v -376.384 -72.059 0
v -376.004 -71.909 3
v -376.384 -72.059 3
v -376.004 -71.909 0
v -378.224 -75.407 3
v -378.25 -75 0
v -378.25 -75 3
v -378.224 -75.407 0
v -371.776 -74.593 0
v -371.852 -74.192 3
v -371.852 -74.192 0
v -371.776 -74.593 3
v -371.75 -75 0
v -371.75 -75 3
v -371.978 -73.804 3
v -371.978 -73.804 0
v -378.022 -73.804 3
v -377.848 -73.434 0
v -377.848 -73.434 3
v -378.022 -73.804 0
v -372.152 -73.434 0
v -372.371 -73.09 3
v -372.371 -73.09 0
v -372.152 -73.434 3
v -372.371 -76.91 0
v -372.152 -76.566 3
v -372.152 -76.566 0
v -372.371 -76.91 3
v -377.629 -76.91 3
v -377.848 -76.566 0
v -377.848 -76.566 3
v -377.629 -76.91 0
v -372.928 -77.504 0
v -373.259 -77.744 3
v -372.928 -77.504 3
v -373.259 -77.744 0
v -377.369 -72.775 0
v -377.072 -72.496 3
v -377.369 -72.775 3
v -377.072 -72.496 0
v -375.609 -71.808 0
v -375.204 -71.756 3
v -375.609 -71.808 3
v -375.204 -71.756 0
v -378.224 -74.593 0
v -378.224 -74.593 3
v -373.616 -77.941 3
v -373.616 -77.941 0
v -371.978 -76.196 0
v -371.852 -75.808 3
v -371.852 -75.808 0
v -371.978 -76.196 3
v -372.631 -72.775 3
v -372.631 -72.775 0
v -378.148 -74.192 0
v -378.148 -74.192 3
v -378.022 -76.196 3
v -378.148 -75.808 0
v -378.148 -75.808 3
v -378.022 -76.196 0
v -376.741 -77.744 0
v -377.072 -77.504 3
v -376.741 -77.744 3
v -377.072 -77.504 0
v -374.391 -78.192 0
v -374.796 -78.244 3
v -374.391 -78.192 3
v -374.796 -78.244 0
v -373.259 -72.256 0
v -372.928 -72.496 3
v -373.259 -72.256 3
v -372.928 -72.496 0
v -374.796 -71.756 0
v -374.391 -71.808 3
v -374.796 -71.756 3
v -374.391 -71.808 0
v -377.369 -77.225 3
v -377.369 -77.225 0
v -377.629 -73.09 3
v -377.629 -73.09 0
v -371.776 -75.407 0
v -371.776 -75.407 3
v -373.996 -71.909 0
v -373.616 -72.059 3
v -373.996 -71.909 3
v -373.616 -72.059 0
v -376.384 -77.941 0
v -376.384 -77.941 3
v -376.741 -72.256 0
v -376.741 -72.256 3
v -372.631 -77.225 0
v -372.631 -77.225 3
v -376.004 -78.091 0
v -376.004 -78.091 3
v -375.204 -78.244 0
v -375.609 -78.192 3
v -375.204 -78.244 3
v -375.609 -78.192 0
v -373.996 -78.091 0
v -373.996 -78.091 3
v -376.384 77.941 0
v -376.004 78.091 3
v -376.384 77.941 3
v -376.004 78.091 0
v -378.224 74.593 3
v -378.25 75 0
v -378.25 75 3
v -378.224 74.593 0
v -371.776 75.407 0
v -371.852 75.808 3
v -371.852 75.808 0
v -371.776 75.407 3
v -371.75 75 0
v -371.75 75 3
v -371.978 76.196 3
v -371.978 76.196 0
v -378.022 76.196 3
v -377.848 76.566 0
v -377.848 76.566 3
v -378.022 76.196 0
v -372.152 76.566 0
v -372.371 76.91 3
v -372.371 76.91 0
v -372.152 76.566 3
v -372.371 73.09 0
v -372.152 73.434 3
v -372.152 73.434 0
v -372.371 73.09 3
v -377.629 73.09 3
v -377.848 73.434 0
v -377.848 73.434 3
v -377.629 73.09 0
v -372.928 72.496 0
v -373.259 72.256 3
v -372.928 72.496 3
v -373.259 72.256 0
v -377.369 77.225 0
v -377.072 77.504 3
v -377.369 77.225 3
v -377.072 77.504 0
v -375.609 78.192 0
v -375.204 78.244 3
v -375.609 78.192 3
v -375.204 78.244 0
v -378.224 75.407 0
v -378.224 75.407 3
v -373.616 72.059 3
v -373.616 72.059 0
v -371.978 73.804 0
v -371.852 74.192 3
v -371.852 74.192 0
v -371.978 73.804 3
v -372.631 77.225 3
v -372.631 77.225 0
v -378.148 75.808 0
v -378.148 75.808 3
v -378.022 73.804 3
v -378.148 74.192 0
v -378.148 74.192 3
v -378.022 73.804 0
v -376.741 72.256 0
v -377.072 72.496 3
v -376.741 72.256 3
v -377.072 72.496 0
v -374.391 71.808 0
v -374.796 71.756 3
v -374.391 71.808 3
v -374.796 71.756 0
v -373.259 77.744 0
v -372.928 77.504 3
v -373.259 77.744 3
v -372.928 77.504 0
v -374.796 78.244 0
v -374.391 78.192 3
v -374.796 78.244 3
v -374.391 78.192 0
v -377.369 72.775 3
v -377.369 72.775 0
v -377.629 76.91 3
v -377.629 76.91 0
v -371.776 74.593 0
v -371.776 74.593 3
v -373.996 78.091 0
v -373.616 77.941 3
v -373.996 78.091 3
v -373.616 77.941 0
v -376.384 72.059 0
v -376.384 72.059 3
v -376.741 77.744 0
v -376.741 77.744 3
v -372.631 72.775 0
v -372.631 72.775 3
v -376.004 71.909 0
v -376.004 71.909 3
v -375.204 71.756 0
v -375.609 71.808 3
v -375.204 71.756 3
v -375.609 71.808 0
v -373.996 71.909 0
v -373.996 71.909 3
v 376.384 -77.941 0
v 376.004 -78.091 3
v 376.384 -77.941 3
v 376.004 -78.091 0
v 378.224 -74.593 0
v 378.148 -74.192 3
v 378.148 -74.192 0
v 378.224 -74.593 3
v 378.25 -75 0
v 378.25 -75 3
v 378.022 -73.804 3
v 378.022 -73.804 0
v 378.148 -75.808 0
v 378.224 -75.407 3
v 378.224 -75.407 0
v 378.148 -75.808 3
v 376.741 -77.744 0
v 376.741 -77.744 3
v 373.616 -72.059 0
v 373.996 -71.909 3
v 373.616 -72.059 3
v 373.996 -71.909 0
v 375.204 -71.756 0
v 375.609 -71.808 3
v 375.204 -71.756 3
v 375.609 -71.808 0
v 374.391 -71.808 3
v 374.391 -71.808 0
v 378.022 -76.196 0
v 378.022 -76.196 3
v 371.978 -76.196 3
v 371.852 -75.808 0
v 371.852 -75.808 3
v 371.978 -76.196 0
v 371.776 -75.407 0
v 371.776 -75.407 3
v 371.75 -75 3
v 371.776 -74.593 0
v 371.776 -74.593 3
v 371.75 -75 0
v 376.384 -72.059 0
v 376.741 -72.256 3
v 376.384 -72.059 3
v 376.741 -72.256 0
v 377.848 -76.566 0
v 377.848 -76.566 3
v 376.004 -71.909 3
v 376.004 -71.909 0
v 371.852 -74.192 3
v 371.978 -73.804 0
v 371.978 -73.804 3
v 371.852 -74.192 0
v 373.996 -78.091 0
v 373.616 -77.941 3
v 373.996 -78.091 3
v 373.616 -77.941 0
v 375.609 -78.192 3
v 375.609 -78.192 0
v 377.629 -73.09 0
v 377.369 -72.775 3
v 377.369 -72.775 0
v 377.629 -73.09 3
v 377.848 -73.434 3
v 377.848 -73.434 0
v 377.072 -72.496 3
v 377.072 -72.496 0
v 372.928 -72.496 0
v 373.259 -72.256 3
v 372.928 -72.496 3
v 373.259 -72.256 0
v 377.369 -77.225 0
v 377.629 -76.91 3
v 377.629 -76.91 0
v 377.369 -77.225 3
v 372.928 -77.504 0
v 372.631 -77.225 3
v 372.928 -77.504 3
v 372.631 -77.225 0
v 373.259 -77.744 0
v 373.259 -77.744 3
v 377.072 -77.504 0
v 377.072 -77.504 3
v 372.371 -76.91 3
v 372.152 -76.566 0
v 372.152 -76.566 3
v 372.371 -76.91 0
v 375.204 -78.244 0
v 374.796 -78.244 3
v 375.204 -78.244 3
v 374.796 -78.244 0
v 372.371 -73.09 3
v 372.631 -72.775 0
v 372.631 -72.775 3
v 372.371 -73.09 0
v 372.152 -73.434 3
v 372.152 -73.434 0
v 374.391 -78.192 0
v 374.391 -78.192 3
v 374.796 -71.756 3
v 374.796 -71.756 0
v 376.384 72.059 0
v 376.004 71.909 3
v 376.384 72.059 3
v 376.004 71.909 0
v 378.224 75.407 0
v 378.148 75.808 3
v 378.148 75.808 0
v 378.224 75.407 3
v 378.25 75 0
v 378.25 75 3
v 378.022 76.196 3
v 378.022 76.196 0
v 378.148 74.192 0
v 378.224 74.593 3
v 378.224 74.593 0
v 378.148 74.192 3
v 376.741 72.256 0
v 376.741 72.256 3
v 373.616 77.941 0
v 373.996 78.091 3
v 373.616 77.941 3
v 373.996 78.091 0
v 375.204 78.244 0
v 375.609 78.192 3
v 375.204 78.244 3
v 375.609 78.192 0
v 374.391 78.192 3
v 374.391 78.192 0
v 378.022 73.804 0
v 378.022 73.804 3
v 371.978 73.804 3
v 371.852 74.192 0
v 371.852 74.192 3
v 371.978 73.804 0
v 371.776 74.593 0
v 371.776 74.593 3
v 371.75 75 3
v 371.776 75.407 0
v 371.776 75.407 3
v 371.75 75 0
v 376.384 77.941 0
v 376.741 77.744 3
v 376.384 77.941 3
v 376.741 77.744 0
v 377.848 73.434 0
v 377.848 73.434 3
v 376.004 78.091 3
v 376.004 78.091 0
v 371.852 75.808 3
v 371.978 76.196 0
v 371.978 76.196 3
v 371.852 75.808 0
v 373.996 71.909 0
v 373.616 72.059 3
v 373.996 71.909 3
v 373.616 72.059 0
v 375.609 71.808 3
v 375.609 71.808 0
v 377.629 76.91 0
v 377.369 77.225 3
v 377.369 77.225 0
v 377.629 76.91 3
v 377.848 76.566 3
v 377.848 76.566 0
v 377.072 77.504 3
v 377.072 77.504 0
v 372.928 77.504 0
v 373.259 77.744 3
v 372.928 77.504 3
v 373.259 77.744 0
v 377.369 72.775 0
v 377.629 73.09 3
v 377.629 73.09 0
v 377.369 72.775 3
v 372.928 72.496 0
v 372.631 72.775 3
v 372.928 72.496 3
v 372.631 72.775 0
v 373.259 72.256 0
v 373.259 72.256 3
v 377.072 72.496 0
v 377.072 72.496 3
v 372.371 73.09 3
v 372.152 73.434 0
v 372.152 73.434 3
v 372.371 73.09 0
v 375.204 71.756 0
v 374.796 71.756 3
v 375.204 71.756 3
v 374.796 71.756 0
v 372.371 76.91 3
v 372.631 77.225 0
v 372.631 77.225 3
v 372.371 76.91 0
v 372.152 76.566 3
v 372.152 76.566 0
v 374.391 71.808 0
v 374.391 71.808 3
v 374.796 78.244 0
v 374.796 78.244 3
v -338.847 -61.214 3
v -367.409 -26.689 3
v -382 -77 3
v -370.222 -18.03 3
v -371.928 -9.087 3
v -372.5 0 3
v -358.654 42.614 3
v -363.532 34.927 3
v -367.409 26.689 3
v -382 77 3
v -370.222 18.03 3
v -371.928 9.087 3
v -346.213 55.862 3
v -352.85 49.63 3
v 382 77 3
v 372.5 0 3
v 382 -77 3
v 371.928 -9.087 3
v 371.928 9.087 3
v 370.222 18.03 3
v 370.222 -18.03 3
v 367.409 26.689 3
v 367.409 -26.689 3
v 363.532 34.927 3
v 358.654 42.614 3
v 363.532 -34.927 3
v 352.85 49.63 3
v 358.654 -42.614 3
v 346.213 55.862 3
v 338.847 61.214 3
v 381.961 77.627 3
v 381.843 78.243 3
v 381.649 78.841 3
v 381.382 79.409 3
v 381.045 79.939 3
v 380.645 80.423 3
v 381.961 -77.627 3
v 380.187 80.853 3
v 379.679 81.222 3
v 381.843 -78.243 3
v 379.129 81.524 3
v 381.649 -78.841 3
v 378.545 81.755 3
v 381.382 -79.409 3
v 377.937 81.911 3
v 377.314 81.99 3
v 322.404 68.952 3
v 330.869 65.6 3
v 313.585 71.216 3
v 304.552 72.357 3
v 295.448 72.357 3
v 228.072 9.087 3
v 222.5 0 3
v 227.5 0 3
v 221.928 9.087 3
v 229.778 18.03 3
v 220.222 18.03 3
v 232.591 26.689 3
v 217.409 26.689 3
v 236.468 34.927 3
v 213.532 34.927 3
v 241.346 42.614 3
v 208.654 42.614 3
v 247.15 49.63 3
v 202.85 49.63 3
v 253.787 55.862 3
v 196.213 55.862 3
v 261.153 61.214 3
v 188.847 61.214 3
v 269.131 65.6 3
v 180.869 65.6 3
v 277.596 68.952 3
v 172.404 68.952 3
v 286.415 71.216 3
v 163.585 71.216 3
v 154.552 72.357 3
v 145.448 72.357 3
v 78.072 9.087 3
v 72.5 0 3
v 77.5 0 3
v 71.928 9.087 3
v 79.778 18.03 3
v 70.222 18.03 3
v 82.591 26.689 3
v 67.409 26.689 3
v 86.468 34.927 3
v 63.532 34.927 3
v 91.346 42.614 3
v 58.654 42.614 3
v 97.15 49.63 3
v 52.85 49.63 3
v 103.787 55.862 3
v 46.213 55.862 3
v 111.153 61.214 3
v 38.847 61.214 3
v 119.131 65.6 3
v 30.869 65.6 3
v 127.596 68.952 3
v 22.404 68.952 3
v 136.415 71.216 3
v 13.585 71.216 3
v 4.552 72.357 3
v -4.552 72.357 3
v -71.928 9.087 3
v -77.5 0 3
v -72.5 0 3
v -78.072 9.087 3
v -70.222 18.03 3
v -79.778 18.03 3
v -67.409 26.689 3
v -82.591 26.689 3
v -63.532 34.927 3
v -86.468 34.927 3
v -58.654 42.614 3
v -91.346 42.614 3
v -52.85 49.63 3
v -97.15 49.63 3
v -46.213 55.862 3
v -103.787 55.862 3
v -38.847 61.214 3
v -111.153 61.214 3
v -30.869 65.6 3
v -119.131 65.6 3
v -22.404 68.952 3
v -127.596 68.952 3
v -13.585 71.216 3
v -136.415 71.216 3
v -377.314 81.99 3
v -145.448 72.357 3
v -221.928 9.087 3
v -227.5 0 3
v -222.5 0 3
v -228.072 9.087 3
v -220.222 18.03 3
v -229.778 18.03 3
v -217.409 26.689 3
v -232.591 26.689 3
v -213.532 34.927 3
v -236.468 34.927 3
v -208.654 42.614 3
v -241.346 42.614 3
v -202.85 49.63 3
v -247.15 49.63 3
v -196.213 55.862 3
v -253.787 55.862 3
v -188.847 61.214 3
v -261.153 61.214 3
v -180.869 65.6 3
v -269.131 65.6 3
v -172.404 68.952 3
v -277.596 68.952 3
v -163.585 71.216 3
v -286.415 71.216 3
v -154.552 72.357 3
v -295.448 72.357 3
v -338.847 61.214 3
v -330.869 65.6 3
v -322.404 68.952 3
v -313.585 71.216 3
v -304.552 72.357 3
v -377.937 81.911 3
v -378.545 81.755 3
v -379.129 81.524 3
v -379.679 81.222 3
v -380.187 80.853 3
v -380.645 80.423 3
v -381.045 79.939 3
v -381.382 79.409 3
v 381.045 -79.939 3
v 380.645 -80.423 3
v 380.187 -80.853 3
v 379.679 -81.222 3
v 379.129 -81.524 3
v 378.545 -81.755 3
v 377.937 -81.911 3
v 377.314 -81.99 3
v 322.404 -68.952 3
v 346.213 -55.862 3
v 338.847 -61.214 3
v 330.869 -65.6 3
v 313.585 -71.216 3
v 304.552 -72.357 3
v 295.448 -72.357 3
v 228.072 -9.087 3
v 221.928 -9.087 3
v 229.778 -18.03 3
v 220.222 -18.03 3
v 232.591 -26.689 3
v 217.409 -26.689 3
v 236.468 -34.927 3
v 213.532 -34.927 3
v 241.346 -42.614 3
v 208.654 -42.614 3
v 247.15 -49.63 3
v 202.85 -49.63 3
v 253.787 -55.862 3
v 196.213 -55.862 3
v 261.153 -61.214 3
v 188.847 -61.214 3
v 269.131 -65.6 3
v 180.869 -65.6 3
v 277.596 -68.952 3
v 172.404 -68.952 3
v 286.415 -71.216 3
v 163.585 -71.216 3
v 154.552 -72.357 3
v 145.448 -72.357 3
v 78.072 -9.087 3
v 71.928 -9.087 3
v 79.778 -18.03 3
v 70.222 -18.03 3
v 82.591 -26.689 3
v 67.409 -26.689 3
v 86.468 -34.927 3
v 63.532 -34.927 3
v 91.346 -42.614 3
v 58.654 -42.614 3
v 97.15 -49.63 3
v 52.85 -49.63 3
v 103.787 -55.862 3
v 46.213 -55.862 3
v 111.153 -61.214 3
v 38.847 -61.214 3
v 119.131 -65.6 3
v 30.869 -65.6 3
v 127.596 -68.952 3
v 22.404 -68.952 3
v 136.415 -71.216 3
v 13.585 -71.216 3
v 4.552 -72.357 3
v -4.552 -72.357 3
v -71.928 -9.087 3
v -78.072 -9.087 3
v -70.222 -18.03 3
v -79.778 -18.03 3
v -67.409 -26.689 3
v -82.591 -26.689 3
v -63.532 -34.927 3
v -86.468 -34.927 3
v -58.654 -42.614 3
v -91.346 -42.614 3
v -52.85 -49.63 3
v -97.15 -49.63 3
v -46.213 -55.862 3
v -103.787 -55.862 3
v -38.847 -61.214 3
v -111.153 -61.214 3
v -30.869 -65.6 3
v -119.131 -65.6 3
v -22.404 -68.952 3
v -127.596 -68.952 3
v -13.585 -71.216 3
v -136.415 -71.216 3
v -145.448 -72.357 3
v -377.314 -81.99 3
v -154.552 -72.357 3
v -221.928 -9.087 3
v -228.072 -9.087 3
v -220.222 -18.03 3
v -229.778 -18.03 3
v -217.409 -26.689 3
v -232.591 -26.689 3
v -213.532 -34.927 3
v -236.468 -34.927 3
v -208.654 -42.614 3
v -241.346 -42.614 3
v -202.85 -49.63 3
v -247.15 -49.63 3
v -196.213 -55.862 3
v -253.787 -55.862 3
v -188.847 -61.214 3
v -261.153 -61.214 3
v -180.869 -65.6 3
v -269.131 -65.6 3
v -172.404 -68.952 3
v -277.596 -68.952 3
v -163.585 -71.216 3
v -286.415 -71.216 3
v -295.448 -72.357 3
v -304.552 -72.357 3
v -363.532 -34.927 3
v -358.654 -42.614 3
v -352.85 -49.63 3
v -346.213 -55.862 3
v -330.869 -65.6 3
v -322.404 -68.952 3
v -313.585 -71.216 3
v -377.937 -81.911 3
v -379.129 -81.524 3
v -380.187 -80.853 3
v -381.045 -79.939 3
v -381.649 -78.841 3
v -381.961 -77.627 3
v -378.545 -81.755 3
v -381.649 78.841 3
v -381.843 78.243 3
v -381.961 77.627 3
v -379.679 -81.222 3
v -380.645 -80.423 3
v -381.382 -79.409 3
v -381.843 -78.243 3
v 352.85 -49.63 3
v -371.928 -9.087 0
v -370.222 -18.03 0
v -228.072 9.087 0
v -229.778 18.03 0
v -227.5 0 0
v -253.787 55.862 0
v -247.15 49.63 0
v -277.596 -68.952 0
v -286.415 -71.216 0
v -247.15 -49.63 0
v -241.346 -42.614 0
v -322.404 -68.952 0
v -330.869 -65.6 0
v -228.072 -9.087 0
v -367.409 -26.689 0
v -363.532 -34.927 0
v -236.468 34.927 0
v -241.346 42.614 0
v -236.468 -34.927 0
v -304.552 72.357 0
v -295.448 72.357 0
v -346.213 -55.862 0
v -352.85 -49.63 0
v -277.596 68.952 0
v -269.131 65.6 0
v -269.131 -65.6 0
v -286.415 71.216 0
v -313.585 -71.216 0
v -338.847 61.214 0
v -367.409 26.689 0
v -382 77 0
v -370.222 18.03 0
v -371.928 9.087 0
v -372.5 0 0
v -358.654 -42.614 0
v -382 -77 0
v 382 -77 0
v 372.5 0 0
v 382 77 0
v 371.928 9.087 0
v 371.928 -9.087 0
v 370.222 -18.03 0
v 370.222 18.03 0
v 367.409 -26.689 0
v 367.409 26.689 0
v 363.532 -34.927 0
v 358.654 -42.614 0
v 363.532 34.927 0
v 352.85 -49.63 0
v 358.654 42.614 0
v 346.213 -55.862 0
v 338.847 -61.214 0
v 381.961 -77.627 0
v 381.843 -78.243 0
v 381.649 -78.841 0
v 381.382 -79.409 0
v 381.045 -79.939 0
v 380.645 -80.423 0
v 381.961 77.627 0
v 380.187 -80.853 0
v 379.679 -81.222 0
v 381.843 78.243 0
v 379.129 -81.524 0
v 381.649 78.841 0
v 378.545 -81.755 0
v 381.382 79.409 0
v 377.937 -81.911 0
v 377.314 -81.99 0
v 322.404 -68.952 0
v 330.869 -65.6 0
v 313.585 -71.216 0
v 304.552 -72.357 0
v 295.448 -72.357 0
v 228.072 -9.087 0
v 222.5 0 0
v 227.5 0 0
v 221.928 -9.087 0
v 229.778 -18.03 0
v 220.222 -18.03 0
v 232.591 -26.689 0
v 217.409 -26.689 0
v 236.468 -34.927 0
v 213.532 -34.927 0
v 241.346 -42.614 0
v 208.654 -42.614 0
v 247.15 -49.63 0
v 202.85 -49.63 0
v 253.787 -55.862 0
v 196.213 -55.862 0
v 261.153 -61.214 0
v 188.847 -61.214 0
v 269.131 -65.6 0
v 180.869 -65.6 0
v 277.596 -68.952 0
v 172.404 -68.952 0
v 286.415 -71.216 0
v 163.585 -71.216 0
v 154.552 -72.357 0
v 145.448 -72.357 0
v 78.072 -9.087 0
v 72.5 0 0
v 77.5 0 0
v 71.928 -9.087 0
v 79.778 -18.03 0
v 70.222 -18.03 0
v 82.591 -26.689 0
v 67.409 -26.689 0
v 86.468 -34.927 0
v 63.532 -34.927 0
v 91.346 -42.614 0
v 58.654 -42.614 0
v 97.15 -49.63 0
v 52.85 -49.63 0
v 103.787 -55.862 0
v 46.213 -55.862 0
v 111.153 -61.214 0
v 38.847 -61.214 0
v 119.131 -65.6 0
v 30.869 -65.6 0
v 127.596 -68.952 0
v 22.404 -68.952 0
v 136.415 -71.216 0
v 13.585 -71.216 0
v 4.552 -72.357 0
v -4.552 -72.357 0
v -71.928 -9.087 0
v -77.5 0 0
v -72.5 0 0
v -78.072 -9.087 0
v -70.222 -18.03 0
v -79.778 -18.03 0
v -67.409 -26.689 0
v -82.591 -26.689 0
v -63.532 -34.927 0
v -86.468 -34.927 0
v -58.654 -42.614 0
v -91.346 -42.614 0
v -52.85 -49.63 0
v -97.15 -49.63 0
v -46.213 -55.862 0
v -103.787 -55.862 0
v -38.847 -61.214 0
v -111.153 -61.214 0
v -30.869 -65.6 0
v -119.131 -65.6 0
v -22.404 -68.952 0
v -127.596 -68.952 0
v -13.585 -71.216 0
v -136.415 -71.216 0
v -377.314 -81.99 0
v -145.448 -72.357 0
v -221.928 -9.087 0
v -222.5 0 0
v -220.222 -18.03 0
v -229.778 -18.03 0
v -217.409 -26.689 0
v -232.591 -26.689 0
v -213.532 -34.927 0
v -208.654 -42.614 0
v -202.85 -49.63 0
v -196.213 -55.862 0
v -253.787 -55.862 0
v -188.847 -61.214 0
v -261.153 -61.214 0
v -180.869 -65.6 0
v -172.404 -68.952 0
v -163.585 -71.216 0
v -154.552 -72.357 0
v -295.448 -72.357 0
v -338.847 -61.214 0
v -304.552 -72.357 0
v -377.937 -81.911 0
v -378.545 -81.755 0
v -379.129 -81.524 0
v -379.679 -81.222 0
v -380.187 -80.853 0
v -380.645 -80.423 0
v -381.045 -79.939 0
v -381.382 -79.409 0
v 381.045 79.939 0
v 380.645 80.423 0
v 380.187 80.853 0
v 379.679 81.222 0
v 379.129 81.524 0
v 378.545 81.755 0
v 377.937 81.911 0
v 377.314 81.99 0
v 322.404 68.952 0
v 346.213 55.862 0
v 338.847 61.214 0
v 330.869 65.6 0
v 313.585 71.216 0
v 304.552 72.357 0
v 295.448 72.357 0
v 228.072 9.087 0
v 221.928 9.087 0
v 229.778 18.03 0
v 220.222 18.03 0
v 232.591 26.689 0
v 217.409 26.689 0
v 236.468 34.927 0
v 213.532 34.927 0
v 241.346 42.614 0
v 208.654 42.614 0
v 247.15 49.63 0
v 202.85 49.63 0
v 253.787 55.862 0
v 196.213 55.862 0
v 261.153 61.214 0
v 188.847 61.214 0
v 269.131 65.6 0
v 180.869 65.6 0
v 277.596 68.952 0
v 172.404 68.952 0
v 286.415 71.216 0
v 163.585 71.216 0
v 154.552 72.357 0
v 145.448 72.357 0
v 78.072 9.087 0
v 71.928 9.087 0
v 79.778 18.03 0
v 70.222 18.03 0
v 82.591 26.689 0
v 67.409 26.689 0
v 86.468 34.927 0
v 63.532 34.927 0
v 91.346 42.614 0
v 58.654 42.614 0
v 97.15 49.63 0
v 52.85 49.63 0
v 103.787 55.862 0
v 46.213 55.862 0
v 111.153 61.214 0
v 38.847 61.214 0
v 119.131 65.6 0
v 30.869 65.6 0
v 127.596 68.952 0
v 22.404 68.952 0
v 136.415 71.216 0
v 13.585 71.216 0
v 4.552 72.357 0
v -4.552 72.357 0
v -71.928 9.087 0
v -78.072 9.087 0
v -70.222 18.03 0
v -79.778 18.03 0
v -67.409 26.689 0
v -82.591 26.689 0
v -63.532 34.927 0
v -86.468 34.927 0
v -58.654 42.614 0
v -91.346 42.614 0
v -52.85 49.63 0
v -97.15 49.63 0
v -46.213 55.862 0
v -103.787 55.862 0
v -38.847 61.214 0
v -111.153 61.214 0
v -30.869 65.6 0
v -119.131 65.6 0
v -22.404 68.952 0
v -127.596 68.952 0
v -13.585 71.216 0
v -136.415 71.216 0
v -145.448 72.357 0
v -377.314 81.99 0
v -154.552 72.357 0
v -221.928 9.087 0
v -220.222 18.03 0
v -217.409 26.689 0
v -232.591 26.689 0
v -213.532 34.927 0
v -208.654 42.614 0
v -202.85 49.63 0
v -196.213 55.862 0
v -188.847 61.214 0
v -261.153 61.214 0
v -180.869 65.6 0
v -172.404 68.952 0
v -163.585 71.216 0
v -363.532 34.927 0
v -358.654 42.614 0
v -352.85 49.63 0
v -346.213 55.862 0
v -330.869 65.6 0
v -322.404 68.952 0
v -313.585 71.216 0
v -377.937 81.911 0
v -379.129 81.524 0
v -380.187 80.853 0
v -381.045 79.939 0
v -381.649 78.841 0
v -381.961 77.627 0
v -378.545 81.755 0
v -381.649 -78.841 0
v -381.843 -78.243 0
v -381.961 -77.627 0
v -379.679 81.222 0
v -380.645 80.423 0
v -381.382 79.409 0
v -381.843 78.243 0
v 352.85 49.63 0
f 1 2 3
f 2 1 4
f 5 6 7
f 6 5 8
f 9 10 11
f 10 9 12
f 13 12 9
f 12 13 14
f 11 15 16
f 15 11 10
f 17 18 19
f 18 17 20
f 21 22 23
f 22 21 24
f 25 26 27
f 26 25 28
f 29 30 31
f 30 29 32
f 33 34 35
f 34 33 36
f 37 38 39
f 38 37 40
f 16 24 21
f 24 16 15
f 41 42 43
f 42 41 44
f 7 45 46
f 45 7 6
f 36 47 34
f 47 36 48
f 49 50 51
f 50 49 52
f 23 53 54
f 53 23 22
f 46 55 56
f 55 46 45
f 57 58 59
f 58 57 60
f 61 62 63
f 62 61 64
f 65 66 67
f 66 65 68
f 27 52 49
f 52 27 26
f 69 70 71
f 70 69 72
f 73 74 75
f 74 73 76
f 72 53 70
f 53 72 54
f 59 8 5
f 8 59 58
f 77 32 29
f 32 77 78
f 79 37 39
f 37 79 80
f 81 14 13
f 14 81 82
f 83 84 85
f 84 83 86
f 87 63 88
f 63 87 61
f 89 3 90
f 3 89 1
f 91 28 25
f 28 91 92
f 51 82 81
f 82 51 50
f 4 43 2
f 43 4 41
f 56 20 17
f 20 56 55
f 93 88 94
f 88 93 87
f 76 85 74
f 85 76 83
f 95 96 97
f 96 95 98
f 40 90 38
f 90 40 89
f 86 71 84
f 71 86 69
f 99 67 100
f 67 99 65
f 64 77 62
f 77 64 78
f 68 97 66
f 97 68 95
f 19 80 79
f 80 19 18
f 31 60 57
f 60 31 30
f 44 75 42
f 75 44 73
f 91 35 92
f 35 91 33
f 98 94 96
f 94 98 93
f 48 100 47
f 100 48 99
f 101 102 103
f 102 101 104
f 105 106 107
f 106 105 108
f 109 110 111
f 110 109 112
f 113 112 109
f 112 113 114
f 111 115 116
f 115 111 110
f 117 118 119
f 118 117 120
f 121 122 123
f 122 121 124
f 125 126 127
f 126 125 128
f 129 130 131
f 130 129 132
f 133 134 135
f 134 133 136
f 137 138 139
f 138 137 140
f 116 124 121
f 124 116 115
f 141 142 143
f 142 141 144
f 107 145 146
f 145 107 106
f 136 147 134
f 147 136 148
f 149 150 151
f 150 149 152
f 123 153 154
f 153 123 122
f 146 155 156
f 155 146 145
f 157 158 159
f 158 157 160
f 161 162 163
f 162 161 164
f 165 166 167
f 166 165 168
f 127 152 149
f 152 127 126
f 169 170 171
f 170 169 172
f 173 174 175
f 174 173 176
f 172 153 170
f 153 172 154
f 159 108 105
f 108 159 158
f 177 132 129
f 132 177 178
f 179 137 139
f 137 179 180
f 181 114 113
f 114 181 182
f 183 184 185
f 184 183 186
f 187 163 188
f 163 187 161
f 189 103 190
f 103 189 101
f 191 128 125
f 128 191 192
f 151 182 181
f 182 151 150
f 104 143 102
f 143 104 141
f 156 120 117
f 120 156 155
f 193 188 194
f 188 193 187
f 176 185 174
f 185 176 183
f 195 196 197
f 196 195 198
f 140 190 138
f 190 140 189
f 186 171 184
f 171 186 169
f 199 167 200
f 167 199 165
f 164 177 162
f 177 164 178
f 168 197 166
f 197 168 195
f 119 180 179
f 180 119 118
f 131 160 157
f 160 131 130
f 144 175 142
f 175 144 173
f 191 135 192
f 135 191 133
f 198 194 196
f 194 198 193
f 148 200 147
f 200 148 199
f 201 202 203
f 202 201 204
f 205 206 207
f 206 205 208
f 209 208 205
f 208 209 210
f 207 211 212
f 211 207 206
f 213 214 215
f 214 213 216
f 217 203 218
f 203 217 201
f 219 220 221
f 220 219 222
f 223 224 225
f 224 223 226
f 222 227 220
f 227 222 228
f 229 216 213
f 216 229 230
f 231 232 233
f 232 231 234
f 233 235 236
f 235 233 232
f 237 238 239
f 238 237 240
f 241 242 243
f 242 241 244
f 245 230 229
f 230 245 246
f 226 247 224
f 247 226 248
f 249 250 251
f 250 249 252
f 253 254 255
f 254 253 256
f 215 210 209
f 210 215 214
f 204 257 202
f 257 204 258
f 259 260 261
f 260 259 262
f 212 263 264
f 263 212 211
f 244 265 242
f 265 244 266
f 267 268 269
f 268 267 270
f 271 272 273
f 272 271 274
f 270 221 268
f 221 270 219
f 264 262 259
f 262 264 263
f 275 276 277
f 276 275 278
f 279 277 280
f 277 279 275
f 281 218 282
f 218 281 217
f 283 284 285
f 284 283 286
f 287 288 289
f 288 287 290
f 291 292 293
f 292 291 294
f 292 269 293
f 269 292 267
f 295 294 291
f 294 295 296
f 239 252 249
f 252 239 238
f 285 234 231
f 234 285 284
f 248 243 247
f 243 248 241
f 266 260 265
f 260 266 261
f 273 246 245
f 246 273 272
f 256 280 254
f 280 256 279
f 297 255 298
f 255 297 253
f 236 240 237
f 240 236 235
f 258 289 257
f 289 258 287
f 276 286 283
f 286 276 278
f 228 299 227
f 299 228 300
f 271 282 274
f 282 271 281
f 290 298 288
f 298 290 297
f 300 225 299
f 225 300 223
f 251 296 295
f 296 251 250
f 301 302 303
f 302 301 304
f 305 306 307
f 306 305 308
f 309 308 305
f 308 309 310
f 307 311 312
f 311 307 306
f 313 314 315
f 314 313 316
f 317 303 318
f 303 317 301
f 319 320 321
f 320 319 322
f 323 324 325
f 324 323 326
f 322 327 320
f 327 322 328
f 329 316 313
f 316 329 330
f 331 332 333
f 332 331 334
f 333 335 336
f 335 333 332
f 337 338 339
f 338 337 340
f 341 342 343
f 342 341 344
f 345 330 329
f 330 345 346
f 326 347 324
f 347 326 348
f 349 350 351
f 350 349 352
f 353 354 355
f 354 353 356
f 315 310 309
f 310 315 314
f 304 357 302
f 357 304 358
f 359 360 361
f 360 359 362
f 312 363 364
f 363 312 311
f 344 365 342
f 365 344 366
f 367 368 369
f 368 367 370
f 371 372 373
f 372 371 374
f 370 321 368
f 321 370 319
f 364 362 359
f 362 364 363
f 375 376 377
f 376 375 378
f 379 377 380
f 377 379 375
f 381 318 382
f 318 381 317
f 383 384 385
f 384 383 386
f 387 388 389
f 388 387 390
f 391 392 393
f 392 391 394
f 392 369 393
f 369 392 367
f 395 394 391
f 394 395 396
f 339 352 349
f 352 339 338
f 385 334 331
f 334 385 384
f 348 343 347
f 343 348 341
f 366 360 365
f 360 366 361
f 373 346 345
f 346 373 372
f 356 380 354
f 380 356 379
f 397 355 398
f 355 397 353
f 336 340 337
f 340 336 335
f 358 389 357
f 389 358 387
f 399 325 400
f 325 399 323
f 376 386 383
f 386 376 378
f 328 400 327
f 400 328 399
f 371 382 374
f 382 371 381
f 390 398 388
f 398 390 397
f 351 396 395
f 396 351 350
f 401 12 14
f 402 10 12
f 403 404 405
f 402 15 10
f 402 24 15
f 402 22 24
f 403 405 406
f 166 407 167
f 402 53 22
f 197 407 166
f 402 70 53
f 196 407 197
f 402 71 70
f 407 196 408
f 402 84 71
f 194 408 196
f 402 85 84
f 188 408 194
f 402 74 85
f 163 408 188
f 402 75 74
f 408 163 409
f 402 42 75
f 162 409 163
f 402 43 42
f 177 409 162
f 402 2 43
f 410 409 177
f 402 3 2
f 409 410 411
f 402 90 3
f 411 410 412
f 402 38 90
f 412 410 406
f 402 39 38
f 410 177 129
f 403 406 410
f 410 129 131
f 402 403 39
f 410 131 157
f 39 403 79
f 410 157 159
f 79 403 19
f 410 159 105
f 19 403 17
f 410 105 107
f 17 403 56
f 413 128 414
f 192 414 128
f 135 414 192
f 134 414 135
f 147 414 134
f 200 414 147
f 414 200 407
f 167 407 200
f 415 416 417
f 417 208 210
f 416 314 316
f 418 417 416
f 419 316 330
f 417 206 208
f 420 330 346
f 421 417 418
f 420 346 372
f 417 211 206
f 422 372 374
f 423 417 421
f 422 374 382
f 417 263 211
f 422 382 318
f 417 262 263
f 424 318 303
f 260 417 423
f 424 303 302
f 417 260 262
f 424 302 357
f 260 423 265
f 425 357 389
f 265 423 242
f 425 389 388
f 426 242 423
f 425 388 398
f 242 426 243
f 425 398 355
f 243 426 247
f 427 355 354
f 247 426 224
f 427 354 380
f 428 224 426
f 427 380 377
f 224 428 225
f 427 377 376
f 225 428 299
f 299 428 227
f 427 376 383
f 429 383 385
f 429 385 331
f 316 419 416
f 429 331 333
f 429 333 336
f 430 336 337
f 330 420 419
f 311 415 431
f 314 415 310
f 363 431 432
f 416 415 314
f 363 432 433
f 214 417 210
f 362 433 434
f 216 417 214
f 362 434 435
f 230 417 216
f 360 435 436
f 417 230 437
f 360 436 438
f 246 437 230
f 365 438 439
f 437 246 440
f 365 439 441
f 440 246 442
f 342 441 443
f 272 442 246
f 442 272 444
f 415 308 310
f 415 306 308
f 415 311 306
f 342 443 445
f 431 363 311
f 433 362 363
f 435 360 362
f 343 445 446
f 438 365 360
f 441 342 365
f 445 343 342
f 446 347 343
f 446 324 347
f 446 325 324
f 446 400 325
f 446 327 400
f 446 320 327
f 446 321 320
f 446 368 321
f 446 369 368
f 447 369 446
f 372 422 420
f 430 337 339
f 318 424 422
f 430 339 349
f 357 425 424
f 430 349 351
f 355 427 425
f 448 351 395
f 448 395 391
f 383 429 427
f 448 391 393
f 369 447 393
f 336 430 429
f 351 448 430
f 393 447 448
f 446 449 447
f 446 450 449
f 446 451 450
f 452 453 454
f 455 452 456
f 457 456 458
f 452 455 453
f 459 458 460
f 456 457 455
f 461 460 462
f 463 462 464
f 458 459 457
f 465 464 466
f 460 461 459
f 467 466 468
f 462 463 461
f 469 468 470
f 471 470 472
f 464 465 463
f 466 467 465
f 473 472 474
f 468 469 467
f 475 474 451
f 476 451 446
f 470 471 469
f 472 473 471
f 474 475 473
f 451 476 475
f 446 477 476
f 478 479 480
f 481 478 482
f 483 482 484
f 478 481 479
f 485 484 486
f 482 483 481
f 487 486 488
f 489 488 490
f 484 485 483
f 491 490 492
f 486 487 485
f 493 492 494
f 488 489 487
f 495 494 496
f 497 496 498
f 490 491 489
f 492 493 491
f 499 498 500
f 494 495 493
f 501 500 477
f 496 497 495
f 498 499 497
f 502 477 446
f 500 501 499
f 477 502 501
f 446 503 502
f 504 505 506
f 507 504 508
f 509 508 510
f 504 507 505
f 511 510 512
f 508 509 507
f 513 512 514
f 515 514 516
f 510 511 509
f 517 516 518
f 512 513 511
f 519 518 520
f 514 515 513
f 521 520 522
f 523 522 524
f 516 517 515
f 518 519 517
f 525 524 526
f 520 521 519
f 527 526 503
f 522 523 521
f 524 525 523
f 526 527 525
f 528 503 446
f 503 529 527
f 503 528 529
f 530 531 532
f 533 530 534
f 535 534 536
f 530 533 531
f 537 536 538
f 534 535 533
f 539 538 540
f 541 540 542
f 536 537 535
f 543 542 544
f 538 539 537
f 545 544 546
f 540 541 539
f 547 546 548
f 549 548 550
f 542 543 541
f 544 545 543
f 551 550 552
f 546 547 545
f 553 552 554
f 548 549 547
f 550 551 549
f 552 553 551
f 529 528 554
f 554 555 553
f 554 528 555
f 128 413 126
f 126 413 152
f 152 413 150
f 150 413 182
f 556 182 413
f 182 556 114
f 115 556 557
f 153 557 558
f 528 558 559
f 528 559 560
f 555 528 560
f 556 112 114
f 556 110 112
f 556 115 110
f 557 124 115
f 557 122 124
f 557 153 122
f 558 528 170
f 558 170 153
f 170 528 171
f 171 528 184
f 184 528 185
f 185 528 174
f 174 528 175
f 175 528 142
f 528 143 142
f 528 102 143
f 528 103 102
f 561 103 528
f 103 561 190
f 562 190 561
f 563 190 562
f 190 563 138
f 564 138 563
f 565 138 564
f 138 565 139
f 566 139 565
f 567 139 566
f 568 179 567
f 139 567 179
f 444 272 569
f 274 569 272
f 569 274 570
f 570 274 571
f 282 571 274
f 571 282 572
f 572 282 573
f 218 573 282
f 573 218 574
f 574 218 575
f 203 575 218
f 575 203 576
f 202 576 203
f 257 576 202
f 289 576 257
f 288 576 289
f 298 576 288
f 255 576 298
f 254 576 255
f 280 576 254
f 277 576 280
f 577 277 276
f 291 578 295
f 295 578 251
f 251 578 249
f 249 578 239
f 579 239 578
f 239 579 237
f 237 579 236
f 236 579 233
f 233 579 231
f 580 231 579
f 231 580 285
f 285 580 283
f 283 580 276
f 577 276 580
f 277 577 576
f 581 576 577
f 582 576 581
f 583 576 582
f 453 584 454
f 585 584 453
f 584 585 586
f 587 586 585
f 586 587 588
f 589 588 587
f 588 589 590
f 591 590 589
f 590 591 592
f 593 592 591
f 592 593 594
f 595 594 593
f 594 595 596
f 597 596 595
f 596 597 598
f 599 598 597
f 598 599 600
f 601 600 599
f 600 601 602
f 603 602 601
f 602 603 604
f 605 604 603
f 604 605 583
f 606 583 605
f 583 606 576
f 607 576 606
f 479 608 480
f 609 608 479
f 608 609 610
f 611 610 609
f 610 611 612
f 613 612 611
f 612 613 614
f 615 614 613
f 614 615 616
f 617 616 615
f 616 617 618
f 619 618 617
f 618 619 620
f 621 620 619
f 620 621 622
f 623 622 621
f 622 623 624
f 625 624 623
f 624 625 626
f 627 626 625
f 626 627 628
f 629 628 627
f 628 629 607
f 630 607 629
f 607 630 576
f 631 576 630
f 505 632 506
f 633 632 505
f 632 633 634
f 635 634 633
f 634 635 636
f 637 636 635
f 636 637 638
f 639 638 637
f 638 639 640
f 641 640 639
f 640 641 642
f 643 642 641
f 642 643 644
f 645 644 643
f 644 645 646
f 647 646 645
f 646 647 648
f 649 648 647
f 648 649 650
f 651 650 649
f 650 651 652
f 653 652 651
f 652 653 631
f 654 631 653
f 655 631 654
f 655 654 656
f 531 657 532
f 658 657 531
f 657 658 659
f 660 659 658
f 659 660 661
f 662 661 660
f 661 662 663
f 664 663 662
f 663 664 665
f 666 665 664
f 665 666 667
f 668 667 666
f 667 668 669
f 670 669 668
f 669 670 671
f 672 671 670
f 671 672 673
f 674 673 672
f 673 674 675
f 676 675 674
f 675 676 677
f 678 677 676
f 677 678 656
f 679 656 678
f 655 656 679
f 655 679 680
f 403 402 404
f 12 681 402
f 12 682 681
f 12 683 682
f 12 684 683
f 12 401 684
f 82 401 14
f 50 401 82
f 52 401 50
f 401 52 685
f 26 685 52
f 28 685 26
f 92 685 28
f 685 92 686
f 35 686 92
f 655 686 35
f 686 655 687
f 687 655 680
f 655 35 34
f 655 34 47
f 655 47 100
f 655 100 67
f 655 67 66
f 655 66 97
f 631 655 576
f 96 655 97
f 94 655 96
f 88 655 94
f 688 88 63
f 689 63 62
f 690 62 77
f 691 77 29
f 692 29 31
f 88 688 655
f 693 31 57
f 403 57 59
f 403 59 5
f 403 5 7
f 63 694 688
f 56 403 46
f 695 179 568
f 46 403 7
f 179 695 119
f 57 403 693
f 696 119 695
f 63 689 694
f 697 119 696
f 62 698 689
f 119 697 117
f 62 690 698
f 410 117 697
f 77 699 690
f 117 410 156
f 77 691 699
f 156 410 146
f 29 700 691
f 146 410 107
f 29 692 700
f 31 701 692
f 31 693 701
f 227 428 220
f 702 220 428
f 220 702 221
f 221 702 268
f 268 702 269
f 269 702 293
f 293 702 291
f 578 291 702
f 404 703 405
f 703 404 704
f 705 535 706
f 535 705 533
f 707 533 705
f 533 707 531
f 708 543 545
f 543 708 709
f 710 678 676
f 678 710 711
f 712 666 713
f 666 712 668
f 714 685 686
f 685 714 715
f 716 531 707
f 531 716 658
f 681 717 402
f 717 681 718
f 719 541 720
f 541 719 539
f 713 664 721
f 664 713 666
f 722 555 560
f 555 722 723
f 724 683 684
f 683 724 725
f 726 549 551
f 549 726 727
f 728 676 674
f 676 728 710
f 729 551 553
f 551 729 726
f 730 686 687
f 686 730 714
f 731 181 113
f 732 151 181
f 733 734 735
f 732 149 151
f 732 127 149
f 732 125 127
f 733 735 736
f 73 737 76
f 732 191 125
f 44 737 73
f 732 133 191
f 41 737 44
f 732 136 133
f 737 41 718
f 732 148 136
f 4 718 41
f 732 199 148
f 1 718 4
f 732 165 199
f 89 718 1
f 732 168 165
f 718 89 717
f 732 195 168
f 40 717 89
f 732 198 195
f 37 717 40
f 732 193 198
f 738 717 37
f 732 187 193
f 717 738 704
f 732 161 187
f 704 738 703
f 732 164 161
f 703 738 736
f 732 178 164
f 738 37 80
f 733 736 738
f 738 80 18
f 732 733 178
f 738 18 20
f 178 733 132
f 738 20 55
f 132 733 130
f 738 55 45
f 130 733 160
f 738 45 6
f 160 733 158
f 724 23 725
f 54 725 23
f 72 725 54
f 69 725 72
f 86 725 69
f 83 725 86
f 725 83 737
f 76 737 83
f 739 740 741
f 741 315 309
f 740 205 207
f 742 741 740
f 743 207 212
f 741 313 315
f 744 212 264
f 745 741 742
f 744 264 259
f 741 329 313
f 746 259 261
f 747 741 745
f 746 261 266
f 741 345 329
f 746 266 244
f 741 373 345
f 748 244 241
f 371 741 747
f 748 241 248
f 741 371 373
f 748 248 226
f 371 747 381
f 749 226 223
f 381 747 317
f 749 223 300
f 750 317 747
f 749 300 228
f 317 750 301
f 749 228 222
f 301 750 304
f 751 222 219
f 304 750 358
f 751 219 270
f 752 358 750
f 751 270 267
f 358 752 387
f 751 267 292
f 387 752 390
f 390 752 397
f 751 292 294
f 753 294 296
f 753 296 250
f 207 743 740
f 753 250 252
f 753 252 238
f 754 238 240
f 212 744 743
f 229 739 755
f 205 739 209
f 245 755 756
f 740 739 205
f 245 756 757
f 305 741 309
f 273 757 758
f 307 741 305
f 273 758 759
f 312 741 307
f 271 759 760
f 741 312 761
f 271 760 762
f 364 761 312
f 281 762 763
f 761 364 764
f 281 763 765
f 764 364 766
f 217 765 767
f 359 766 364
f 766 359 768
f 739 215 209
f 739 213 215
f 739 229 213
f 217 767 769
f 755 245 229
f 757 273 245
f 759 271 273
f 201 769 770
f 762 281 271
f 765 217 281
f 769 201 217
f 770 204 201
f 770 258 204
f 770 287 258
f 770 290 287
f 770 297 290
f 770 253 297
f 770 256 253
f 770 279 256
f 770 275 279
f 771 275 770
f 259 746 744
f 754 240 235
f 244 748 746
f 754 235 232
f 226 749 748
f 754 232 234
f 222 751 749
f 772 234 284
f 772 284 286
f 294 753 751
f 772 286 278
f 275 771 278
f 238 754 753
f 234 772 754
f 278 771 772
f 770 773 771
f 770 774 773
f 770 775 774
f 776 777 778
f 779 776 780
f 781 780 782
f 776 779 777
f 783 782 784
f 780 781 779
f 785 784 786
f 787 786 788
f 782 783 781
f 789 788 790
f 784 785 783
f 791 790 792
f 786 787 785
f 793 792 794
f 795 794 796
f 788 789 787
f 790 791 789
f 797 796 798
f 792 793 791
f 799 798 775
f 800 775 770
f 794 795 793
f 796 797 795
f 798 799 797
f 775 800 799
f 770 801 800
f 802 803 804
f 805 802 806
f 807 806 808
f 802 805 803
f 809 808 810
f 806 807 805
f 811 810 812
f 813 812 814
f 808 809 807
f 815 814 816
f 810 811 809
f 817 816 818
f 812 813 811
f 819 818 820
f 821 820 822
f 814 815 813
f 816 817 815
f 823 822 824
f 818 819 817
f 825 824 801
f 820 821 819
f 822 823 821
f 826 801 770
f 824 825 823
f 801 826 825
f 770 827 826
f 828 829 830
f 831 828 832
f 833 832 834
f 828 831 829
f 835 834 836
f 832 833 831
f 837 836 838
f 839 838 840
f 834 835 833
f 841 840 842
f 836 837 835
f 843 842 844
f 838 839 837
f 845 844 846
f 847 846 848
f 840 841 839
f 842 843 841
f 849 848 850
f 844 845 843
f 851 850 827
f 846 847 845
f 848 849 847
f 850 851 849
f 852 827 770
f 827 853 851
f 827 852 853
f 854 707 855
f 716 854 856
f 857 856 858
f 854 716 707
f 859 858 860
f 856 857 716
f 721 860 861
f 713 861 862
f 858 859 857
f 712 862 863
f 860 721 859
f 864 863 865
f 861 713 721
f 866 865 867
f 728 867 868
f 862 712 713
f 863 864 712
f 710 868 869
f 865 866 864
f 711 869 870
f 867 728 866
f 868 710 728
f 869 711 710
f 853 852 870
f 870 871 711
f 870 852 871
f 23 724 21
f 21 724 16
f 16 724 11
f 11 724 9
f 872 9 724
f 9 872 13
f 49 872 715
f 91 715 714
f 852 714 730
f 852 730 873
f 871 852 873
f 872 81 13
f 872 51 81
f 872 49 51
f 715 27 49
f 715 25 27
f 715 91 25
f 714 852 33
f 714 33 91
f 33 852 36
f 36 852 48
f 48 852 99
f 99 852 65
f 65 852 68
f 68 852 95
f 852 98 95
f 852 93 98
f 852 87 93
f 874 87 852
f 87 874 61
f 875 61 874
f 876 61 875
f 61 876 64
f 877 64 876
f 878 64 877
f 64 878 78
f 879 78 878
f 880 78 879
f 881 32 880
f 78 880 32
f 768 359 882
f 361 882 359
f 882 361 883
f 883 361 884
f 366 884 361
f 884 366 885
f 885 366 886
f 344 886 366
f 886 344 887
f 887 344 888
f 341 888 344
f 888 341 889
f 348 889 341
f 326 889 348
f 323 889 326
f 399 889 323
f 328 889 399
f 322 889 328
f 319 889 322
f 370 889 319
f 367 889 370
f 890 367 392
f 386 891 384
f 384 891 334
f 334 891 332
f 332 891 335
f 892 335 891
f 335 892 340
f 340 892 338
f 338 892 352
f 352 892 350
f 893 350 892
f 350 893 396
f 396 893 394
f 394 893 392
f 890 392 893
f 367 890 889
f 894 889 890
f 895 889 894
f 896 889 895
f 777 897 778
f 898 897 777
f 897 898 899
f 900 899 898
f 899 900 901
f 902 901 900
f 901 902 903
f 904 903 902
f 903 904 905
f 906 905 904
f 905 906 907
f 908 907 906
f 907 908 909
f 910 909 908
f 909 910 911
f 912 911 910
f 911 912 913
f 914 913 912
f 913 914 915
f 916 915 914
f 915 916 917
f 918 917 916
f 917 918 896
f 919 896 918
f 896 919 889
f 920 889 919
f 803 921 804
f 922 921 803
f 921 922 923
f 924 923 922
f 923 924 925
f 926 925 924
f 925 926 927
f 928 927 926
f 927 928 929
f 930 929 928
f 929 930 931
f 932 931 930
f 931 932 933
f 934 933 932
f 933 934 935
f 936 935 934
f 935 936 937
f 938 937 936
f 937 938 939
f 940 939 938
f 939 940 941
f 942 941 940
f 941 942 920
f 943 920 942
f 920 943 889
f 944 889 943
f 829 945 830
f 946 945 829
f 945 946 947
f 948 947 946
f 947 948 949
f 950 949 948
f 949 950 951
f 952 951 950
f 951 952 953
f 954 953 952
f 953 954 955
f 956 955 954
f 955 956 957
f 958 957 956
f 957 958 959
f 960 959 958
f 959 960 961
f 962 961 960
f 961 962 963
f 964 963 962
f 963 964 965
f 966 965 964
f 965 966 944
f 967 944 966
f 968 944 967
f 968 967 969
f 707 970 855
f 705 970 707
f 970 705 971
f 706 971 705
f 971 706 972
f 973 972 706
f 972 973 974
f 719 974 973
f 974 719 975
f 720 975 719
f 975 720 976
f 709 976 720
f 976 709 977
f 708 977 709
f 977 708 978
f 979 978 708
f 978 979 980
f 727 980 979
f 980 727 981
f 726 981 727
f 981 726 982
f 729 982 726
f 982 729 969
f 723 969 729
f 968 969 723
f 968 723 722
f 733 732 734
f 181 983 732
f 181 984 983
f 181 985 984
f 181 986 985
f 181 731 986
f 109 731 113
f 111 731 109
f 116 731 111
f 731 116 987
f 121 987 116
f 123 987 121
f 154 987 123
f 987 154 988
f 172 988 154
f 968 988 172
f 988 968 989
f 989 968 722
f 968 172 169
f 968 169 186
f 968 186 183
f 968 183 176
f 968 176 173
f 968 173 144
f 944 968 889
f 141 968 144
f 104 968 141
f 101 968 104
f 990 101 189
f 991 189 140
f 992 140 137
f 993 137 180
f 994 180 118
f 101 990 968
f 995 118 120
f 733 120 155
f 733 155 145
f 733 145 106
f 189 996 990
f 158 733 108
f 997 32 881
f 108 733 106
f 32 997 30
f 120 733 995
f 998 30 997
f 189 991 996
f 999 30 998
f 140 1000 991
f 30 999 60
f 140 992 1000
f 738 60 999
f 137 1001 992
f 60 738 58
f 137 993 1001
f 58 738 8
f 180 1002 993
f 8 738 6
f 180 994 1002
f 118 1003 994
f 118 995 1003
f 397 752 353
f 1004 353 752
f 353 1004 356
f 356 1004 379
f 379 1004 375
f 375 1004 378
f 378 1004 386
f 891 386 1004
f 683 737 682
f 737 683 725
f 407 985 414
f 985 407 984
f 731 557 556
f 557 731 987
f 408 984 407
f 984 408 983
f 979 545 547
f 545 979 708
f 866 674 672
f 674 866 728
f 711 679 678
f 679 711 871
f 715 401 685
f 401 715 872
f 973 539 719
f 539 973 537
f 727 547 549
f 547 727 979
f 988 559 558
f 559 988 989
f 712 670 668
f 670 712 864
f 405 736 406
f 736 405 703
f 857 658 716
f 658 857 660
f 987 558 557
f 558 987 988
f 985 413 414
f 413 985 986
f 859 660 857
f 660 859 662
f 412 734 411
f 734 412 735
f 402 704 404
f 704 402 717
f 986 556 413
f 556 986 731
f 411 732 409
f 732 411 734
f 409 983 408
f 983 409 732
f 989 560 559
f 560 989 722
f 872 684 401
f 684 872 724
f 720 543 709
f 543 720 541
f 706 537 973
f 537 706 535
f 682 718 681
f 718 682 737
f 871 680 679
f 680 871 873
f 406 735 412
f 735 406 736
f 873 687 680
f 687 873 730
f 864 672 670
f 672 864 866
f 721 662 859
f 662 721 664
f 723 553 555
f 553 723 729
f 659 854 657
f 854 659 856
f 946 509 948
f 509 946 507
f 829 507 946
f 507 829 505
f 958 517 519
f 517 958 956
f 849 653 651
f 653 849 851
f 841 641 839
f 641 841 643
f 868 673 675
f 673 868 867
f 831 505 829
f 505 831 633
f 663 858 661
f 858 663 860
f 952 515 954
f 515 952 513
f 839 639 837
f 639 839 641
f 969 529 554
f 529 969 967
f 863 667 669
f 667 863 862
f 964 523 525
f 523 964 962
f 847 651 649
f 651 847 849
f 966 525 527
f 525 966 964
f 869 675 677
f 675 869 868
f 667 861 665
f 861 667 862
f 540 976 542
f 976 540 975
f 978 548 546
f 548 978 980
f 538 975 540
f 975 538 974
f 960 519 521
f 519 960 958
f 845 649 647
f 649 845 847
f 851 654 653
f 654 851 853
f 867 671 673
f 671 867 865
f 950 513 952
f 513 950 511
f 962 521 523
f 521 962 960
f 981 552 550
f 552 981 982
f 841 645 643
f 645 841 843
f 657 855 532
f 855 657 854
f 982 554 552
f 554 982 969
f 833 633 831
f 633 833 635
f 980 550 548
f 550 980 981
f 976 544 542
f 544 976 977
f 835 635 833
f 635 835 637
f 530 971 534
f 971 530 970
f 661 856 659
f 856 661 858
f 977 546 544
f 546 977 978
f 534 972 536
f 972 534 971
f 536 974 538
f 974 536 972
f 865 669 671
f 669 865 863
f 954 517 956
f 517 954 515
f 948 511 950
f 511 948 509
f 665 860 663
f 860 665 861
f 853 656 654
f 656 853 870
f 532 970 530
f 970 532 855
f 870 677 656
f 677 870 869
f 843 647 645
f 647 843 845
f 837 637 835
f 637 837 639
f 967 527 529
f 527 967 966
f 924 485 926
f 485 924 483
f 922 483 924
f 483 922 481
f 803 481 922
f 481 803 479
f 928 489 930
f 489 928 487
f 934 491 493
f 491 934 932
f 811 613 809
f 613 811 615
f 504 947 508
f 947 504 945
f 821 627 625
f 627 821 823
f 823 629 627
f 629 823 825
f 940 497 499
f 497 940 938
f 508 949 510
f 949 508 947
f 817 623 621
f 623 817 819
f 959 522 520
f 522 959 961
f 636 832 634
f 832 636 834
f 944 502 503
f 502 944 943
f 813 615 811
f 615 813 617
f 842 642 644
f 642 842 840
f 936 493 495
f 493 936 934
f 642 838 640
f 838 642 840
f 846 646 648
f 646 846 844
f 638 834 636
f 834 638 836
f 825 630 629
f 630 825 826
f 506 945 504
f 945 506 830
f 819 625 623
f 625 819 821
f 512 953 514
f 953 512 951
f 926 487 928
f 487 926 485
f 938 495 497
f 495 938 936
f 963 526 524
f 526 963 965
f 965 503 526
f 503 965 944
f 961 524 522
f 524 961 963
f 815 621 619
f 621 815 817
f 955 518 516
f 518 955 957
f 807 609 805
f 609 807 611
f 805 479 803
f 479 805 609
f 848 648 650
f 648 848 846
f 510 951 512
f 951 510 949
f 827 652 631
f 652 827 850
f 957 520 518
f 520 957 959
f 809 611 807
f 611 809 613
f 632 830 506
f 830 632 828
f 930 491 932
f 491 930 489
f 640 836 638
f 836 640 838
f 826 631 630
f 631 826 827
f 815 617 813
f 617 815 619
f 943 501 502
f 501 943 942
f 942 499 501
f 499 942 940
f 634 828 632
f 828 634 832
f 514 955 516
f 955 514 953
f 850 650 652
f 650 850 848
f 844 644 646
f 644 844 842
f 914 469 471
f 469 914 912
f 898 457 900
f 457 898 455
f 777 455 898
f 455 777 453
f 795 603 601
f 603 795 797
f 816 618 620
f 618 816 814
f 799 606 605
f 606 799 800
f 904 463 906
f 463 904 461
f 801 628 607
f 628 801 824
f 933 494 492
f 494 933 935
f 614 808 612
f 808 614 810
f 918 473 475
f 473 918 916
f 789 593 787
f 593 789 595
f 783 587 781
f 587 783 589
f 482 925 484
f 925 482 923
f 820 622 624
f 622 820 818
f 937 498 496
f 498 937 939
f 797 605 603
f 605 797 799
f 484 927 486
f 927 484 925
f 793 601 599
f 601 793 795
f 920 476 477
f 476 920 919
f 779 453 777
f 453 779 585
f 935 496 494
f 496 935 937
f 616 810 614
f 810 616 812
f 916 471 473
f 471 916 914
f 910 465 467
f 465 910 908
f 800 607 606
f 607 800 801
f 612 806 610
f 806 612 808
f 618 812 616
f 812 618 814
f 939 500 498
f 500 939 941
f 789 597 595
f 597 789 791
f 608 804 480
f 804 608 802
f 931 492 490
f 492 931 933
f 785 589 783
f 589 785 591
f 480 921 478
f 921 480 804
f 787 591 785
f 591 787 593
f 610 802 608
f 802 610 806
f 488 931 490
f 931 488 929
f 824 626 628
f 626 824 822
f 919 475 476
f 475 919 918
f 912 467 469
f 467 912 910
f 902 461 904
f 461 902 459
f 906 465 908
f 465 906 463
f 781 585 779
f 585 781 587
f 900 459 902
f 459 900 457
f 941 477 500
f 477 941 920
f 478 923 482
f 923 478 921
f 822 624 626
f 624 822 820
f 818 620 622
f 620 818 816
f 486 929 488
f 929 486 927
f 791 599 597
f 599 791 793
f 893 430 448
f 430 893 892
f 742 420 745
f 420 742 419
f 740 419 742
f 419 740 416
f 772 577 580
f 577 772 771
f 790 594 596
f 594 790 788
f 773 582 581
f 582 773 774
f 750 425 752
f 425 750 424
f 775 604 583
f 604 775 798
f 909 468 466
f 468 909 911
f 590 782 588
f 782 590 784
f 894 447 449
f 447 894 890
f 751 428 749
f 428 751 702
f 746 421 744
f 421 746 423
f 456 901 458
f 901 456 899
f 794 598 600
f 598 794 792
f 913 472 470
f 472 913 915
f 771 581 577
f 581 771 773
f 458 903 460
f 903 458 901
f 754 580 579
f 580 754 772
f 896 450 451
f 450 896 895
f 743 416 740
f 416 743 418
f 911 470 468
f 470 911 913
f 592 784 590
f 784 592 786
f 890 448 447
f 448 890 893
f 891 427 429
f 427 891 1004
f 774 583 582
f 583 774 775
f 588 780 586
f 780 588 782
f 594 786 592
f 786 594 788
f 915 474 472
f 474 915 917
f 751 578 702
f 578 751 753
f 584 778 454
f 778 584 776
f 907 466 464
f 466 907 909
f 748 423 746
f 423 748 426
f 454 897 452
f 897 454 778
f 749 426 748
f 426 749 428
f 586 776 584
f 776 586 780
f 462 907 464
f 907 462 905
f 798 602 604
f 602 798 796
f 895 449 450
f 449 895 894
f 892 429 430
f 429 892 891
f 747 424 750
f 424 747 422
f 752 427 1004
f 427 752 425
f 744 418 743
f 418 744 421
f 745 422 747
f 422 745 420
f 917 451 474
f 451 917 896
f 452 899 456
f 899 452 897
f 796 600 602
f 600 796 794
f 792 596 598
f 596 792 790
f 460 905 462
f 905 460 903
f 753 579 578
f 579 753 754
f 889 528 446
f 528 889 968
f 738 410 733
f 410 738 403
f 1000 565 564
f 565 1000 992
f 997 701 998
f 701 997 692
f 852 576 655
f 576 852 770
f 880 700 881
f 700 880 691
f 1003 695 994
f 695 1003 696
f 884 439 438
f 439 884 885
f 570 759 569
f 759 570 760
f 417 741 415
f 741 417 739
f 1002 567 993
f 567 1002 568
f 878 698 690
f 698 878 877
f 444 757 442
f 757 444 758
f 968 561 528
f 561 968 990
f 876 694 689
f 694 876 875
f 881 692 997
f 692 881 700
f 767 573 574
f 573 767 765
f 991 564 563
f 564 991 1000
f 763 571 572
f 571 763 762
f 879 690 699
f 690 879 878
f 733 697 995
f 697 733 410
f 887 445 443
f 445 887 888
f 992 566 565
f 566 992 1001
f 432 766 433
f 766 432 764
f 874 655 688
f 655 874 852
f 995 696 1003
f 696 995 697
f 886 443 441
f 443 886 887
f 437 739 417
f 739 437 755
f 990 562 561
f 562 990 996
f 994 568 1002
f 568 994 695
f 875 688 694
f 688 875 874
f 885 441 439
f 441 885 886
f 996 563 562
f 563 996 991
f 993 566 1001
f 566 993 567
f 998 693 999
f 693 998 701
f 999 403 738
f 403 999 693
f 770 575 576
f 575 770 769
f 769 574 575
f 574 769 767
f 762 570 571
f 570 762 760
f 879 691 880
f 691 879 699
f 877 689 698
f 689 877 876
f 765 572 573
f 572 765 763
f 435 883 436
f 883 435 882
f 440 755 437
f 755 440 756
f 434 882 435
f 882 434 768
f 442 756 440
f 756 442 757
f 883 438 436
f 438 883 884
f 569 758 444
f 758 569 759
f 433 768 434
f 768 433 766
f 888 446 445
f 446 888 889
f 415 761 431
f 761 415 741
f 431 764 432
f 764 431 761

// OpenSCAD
$fn = 50;


difference() {
	union() {
		hull() {
			translate(v = [-377.0000000000, 77.0000000000, 0]) {
				cylinder(h = 3, r = 5);
			}
			translate(v = [377.0000000000, 77.0000000000, 0]) {
				cylinder(h = 3, r = 5);
			}
			translate(v = [-377.0000000000, -77.0000000000, 0]) {
				cylinder(h = 3, r = 5);
			}
			translate(v = [377.0000000000, -77.0000000000, 0]) {
				cylinder(h = 3, r = 5);
			}
		}
	}
	union() {
		#translate(v = [-375.0000000000, -75.0000000000, -100.0000000000]) {
			cylinder(h = 200, r = 3.2500000000);
		}
		#translate(v = [-375.0000000000, 75.0000000000, -100.0000000000]) {
			cylinder(h = 200, r = 3.2500000000);
		}
		#translate(v = [375.0000000000, -75.0000000000, -100.0000000000]) {
			cylinder(h = 200, r = 3.2500000000);
		}
		#translate(v = [375.0000000000, 75.0000000000, -100.0000000000]) {
			cylinder(h = 200, r = 3.2500000000);
		}
		#translate(v = [-300.0000000000, 0, 0]) {
			cylinder(h = 3, r = 72.5000000000);
		}
		#translate(v = [-150.0000000000, 0, 0]) {
			cylinder(h = 3, r = 72.5000000000);
		}
		#cylinder(h = 3, r = 72.5000000000);
		#translate(v = [150.0000000000, 0, 0]) {
			cylinder(h = 3, r = 72.5000000000);
		}
		#translate(v = [300.0000000000, 0, 0]) {
			cylinder(h = 3, r = 72.5000000000);
		}
	}
}
